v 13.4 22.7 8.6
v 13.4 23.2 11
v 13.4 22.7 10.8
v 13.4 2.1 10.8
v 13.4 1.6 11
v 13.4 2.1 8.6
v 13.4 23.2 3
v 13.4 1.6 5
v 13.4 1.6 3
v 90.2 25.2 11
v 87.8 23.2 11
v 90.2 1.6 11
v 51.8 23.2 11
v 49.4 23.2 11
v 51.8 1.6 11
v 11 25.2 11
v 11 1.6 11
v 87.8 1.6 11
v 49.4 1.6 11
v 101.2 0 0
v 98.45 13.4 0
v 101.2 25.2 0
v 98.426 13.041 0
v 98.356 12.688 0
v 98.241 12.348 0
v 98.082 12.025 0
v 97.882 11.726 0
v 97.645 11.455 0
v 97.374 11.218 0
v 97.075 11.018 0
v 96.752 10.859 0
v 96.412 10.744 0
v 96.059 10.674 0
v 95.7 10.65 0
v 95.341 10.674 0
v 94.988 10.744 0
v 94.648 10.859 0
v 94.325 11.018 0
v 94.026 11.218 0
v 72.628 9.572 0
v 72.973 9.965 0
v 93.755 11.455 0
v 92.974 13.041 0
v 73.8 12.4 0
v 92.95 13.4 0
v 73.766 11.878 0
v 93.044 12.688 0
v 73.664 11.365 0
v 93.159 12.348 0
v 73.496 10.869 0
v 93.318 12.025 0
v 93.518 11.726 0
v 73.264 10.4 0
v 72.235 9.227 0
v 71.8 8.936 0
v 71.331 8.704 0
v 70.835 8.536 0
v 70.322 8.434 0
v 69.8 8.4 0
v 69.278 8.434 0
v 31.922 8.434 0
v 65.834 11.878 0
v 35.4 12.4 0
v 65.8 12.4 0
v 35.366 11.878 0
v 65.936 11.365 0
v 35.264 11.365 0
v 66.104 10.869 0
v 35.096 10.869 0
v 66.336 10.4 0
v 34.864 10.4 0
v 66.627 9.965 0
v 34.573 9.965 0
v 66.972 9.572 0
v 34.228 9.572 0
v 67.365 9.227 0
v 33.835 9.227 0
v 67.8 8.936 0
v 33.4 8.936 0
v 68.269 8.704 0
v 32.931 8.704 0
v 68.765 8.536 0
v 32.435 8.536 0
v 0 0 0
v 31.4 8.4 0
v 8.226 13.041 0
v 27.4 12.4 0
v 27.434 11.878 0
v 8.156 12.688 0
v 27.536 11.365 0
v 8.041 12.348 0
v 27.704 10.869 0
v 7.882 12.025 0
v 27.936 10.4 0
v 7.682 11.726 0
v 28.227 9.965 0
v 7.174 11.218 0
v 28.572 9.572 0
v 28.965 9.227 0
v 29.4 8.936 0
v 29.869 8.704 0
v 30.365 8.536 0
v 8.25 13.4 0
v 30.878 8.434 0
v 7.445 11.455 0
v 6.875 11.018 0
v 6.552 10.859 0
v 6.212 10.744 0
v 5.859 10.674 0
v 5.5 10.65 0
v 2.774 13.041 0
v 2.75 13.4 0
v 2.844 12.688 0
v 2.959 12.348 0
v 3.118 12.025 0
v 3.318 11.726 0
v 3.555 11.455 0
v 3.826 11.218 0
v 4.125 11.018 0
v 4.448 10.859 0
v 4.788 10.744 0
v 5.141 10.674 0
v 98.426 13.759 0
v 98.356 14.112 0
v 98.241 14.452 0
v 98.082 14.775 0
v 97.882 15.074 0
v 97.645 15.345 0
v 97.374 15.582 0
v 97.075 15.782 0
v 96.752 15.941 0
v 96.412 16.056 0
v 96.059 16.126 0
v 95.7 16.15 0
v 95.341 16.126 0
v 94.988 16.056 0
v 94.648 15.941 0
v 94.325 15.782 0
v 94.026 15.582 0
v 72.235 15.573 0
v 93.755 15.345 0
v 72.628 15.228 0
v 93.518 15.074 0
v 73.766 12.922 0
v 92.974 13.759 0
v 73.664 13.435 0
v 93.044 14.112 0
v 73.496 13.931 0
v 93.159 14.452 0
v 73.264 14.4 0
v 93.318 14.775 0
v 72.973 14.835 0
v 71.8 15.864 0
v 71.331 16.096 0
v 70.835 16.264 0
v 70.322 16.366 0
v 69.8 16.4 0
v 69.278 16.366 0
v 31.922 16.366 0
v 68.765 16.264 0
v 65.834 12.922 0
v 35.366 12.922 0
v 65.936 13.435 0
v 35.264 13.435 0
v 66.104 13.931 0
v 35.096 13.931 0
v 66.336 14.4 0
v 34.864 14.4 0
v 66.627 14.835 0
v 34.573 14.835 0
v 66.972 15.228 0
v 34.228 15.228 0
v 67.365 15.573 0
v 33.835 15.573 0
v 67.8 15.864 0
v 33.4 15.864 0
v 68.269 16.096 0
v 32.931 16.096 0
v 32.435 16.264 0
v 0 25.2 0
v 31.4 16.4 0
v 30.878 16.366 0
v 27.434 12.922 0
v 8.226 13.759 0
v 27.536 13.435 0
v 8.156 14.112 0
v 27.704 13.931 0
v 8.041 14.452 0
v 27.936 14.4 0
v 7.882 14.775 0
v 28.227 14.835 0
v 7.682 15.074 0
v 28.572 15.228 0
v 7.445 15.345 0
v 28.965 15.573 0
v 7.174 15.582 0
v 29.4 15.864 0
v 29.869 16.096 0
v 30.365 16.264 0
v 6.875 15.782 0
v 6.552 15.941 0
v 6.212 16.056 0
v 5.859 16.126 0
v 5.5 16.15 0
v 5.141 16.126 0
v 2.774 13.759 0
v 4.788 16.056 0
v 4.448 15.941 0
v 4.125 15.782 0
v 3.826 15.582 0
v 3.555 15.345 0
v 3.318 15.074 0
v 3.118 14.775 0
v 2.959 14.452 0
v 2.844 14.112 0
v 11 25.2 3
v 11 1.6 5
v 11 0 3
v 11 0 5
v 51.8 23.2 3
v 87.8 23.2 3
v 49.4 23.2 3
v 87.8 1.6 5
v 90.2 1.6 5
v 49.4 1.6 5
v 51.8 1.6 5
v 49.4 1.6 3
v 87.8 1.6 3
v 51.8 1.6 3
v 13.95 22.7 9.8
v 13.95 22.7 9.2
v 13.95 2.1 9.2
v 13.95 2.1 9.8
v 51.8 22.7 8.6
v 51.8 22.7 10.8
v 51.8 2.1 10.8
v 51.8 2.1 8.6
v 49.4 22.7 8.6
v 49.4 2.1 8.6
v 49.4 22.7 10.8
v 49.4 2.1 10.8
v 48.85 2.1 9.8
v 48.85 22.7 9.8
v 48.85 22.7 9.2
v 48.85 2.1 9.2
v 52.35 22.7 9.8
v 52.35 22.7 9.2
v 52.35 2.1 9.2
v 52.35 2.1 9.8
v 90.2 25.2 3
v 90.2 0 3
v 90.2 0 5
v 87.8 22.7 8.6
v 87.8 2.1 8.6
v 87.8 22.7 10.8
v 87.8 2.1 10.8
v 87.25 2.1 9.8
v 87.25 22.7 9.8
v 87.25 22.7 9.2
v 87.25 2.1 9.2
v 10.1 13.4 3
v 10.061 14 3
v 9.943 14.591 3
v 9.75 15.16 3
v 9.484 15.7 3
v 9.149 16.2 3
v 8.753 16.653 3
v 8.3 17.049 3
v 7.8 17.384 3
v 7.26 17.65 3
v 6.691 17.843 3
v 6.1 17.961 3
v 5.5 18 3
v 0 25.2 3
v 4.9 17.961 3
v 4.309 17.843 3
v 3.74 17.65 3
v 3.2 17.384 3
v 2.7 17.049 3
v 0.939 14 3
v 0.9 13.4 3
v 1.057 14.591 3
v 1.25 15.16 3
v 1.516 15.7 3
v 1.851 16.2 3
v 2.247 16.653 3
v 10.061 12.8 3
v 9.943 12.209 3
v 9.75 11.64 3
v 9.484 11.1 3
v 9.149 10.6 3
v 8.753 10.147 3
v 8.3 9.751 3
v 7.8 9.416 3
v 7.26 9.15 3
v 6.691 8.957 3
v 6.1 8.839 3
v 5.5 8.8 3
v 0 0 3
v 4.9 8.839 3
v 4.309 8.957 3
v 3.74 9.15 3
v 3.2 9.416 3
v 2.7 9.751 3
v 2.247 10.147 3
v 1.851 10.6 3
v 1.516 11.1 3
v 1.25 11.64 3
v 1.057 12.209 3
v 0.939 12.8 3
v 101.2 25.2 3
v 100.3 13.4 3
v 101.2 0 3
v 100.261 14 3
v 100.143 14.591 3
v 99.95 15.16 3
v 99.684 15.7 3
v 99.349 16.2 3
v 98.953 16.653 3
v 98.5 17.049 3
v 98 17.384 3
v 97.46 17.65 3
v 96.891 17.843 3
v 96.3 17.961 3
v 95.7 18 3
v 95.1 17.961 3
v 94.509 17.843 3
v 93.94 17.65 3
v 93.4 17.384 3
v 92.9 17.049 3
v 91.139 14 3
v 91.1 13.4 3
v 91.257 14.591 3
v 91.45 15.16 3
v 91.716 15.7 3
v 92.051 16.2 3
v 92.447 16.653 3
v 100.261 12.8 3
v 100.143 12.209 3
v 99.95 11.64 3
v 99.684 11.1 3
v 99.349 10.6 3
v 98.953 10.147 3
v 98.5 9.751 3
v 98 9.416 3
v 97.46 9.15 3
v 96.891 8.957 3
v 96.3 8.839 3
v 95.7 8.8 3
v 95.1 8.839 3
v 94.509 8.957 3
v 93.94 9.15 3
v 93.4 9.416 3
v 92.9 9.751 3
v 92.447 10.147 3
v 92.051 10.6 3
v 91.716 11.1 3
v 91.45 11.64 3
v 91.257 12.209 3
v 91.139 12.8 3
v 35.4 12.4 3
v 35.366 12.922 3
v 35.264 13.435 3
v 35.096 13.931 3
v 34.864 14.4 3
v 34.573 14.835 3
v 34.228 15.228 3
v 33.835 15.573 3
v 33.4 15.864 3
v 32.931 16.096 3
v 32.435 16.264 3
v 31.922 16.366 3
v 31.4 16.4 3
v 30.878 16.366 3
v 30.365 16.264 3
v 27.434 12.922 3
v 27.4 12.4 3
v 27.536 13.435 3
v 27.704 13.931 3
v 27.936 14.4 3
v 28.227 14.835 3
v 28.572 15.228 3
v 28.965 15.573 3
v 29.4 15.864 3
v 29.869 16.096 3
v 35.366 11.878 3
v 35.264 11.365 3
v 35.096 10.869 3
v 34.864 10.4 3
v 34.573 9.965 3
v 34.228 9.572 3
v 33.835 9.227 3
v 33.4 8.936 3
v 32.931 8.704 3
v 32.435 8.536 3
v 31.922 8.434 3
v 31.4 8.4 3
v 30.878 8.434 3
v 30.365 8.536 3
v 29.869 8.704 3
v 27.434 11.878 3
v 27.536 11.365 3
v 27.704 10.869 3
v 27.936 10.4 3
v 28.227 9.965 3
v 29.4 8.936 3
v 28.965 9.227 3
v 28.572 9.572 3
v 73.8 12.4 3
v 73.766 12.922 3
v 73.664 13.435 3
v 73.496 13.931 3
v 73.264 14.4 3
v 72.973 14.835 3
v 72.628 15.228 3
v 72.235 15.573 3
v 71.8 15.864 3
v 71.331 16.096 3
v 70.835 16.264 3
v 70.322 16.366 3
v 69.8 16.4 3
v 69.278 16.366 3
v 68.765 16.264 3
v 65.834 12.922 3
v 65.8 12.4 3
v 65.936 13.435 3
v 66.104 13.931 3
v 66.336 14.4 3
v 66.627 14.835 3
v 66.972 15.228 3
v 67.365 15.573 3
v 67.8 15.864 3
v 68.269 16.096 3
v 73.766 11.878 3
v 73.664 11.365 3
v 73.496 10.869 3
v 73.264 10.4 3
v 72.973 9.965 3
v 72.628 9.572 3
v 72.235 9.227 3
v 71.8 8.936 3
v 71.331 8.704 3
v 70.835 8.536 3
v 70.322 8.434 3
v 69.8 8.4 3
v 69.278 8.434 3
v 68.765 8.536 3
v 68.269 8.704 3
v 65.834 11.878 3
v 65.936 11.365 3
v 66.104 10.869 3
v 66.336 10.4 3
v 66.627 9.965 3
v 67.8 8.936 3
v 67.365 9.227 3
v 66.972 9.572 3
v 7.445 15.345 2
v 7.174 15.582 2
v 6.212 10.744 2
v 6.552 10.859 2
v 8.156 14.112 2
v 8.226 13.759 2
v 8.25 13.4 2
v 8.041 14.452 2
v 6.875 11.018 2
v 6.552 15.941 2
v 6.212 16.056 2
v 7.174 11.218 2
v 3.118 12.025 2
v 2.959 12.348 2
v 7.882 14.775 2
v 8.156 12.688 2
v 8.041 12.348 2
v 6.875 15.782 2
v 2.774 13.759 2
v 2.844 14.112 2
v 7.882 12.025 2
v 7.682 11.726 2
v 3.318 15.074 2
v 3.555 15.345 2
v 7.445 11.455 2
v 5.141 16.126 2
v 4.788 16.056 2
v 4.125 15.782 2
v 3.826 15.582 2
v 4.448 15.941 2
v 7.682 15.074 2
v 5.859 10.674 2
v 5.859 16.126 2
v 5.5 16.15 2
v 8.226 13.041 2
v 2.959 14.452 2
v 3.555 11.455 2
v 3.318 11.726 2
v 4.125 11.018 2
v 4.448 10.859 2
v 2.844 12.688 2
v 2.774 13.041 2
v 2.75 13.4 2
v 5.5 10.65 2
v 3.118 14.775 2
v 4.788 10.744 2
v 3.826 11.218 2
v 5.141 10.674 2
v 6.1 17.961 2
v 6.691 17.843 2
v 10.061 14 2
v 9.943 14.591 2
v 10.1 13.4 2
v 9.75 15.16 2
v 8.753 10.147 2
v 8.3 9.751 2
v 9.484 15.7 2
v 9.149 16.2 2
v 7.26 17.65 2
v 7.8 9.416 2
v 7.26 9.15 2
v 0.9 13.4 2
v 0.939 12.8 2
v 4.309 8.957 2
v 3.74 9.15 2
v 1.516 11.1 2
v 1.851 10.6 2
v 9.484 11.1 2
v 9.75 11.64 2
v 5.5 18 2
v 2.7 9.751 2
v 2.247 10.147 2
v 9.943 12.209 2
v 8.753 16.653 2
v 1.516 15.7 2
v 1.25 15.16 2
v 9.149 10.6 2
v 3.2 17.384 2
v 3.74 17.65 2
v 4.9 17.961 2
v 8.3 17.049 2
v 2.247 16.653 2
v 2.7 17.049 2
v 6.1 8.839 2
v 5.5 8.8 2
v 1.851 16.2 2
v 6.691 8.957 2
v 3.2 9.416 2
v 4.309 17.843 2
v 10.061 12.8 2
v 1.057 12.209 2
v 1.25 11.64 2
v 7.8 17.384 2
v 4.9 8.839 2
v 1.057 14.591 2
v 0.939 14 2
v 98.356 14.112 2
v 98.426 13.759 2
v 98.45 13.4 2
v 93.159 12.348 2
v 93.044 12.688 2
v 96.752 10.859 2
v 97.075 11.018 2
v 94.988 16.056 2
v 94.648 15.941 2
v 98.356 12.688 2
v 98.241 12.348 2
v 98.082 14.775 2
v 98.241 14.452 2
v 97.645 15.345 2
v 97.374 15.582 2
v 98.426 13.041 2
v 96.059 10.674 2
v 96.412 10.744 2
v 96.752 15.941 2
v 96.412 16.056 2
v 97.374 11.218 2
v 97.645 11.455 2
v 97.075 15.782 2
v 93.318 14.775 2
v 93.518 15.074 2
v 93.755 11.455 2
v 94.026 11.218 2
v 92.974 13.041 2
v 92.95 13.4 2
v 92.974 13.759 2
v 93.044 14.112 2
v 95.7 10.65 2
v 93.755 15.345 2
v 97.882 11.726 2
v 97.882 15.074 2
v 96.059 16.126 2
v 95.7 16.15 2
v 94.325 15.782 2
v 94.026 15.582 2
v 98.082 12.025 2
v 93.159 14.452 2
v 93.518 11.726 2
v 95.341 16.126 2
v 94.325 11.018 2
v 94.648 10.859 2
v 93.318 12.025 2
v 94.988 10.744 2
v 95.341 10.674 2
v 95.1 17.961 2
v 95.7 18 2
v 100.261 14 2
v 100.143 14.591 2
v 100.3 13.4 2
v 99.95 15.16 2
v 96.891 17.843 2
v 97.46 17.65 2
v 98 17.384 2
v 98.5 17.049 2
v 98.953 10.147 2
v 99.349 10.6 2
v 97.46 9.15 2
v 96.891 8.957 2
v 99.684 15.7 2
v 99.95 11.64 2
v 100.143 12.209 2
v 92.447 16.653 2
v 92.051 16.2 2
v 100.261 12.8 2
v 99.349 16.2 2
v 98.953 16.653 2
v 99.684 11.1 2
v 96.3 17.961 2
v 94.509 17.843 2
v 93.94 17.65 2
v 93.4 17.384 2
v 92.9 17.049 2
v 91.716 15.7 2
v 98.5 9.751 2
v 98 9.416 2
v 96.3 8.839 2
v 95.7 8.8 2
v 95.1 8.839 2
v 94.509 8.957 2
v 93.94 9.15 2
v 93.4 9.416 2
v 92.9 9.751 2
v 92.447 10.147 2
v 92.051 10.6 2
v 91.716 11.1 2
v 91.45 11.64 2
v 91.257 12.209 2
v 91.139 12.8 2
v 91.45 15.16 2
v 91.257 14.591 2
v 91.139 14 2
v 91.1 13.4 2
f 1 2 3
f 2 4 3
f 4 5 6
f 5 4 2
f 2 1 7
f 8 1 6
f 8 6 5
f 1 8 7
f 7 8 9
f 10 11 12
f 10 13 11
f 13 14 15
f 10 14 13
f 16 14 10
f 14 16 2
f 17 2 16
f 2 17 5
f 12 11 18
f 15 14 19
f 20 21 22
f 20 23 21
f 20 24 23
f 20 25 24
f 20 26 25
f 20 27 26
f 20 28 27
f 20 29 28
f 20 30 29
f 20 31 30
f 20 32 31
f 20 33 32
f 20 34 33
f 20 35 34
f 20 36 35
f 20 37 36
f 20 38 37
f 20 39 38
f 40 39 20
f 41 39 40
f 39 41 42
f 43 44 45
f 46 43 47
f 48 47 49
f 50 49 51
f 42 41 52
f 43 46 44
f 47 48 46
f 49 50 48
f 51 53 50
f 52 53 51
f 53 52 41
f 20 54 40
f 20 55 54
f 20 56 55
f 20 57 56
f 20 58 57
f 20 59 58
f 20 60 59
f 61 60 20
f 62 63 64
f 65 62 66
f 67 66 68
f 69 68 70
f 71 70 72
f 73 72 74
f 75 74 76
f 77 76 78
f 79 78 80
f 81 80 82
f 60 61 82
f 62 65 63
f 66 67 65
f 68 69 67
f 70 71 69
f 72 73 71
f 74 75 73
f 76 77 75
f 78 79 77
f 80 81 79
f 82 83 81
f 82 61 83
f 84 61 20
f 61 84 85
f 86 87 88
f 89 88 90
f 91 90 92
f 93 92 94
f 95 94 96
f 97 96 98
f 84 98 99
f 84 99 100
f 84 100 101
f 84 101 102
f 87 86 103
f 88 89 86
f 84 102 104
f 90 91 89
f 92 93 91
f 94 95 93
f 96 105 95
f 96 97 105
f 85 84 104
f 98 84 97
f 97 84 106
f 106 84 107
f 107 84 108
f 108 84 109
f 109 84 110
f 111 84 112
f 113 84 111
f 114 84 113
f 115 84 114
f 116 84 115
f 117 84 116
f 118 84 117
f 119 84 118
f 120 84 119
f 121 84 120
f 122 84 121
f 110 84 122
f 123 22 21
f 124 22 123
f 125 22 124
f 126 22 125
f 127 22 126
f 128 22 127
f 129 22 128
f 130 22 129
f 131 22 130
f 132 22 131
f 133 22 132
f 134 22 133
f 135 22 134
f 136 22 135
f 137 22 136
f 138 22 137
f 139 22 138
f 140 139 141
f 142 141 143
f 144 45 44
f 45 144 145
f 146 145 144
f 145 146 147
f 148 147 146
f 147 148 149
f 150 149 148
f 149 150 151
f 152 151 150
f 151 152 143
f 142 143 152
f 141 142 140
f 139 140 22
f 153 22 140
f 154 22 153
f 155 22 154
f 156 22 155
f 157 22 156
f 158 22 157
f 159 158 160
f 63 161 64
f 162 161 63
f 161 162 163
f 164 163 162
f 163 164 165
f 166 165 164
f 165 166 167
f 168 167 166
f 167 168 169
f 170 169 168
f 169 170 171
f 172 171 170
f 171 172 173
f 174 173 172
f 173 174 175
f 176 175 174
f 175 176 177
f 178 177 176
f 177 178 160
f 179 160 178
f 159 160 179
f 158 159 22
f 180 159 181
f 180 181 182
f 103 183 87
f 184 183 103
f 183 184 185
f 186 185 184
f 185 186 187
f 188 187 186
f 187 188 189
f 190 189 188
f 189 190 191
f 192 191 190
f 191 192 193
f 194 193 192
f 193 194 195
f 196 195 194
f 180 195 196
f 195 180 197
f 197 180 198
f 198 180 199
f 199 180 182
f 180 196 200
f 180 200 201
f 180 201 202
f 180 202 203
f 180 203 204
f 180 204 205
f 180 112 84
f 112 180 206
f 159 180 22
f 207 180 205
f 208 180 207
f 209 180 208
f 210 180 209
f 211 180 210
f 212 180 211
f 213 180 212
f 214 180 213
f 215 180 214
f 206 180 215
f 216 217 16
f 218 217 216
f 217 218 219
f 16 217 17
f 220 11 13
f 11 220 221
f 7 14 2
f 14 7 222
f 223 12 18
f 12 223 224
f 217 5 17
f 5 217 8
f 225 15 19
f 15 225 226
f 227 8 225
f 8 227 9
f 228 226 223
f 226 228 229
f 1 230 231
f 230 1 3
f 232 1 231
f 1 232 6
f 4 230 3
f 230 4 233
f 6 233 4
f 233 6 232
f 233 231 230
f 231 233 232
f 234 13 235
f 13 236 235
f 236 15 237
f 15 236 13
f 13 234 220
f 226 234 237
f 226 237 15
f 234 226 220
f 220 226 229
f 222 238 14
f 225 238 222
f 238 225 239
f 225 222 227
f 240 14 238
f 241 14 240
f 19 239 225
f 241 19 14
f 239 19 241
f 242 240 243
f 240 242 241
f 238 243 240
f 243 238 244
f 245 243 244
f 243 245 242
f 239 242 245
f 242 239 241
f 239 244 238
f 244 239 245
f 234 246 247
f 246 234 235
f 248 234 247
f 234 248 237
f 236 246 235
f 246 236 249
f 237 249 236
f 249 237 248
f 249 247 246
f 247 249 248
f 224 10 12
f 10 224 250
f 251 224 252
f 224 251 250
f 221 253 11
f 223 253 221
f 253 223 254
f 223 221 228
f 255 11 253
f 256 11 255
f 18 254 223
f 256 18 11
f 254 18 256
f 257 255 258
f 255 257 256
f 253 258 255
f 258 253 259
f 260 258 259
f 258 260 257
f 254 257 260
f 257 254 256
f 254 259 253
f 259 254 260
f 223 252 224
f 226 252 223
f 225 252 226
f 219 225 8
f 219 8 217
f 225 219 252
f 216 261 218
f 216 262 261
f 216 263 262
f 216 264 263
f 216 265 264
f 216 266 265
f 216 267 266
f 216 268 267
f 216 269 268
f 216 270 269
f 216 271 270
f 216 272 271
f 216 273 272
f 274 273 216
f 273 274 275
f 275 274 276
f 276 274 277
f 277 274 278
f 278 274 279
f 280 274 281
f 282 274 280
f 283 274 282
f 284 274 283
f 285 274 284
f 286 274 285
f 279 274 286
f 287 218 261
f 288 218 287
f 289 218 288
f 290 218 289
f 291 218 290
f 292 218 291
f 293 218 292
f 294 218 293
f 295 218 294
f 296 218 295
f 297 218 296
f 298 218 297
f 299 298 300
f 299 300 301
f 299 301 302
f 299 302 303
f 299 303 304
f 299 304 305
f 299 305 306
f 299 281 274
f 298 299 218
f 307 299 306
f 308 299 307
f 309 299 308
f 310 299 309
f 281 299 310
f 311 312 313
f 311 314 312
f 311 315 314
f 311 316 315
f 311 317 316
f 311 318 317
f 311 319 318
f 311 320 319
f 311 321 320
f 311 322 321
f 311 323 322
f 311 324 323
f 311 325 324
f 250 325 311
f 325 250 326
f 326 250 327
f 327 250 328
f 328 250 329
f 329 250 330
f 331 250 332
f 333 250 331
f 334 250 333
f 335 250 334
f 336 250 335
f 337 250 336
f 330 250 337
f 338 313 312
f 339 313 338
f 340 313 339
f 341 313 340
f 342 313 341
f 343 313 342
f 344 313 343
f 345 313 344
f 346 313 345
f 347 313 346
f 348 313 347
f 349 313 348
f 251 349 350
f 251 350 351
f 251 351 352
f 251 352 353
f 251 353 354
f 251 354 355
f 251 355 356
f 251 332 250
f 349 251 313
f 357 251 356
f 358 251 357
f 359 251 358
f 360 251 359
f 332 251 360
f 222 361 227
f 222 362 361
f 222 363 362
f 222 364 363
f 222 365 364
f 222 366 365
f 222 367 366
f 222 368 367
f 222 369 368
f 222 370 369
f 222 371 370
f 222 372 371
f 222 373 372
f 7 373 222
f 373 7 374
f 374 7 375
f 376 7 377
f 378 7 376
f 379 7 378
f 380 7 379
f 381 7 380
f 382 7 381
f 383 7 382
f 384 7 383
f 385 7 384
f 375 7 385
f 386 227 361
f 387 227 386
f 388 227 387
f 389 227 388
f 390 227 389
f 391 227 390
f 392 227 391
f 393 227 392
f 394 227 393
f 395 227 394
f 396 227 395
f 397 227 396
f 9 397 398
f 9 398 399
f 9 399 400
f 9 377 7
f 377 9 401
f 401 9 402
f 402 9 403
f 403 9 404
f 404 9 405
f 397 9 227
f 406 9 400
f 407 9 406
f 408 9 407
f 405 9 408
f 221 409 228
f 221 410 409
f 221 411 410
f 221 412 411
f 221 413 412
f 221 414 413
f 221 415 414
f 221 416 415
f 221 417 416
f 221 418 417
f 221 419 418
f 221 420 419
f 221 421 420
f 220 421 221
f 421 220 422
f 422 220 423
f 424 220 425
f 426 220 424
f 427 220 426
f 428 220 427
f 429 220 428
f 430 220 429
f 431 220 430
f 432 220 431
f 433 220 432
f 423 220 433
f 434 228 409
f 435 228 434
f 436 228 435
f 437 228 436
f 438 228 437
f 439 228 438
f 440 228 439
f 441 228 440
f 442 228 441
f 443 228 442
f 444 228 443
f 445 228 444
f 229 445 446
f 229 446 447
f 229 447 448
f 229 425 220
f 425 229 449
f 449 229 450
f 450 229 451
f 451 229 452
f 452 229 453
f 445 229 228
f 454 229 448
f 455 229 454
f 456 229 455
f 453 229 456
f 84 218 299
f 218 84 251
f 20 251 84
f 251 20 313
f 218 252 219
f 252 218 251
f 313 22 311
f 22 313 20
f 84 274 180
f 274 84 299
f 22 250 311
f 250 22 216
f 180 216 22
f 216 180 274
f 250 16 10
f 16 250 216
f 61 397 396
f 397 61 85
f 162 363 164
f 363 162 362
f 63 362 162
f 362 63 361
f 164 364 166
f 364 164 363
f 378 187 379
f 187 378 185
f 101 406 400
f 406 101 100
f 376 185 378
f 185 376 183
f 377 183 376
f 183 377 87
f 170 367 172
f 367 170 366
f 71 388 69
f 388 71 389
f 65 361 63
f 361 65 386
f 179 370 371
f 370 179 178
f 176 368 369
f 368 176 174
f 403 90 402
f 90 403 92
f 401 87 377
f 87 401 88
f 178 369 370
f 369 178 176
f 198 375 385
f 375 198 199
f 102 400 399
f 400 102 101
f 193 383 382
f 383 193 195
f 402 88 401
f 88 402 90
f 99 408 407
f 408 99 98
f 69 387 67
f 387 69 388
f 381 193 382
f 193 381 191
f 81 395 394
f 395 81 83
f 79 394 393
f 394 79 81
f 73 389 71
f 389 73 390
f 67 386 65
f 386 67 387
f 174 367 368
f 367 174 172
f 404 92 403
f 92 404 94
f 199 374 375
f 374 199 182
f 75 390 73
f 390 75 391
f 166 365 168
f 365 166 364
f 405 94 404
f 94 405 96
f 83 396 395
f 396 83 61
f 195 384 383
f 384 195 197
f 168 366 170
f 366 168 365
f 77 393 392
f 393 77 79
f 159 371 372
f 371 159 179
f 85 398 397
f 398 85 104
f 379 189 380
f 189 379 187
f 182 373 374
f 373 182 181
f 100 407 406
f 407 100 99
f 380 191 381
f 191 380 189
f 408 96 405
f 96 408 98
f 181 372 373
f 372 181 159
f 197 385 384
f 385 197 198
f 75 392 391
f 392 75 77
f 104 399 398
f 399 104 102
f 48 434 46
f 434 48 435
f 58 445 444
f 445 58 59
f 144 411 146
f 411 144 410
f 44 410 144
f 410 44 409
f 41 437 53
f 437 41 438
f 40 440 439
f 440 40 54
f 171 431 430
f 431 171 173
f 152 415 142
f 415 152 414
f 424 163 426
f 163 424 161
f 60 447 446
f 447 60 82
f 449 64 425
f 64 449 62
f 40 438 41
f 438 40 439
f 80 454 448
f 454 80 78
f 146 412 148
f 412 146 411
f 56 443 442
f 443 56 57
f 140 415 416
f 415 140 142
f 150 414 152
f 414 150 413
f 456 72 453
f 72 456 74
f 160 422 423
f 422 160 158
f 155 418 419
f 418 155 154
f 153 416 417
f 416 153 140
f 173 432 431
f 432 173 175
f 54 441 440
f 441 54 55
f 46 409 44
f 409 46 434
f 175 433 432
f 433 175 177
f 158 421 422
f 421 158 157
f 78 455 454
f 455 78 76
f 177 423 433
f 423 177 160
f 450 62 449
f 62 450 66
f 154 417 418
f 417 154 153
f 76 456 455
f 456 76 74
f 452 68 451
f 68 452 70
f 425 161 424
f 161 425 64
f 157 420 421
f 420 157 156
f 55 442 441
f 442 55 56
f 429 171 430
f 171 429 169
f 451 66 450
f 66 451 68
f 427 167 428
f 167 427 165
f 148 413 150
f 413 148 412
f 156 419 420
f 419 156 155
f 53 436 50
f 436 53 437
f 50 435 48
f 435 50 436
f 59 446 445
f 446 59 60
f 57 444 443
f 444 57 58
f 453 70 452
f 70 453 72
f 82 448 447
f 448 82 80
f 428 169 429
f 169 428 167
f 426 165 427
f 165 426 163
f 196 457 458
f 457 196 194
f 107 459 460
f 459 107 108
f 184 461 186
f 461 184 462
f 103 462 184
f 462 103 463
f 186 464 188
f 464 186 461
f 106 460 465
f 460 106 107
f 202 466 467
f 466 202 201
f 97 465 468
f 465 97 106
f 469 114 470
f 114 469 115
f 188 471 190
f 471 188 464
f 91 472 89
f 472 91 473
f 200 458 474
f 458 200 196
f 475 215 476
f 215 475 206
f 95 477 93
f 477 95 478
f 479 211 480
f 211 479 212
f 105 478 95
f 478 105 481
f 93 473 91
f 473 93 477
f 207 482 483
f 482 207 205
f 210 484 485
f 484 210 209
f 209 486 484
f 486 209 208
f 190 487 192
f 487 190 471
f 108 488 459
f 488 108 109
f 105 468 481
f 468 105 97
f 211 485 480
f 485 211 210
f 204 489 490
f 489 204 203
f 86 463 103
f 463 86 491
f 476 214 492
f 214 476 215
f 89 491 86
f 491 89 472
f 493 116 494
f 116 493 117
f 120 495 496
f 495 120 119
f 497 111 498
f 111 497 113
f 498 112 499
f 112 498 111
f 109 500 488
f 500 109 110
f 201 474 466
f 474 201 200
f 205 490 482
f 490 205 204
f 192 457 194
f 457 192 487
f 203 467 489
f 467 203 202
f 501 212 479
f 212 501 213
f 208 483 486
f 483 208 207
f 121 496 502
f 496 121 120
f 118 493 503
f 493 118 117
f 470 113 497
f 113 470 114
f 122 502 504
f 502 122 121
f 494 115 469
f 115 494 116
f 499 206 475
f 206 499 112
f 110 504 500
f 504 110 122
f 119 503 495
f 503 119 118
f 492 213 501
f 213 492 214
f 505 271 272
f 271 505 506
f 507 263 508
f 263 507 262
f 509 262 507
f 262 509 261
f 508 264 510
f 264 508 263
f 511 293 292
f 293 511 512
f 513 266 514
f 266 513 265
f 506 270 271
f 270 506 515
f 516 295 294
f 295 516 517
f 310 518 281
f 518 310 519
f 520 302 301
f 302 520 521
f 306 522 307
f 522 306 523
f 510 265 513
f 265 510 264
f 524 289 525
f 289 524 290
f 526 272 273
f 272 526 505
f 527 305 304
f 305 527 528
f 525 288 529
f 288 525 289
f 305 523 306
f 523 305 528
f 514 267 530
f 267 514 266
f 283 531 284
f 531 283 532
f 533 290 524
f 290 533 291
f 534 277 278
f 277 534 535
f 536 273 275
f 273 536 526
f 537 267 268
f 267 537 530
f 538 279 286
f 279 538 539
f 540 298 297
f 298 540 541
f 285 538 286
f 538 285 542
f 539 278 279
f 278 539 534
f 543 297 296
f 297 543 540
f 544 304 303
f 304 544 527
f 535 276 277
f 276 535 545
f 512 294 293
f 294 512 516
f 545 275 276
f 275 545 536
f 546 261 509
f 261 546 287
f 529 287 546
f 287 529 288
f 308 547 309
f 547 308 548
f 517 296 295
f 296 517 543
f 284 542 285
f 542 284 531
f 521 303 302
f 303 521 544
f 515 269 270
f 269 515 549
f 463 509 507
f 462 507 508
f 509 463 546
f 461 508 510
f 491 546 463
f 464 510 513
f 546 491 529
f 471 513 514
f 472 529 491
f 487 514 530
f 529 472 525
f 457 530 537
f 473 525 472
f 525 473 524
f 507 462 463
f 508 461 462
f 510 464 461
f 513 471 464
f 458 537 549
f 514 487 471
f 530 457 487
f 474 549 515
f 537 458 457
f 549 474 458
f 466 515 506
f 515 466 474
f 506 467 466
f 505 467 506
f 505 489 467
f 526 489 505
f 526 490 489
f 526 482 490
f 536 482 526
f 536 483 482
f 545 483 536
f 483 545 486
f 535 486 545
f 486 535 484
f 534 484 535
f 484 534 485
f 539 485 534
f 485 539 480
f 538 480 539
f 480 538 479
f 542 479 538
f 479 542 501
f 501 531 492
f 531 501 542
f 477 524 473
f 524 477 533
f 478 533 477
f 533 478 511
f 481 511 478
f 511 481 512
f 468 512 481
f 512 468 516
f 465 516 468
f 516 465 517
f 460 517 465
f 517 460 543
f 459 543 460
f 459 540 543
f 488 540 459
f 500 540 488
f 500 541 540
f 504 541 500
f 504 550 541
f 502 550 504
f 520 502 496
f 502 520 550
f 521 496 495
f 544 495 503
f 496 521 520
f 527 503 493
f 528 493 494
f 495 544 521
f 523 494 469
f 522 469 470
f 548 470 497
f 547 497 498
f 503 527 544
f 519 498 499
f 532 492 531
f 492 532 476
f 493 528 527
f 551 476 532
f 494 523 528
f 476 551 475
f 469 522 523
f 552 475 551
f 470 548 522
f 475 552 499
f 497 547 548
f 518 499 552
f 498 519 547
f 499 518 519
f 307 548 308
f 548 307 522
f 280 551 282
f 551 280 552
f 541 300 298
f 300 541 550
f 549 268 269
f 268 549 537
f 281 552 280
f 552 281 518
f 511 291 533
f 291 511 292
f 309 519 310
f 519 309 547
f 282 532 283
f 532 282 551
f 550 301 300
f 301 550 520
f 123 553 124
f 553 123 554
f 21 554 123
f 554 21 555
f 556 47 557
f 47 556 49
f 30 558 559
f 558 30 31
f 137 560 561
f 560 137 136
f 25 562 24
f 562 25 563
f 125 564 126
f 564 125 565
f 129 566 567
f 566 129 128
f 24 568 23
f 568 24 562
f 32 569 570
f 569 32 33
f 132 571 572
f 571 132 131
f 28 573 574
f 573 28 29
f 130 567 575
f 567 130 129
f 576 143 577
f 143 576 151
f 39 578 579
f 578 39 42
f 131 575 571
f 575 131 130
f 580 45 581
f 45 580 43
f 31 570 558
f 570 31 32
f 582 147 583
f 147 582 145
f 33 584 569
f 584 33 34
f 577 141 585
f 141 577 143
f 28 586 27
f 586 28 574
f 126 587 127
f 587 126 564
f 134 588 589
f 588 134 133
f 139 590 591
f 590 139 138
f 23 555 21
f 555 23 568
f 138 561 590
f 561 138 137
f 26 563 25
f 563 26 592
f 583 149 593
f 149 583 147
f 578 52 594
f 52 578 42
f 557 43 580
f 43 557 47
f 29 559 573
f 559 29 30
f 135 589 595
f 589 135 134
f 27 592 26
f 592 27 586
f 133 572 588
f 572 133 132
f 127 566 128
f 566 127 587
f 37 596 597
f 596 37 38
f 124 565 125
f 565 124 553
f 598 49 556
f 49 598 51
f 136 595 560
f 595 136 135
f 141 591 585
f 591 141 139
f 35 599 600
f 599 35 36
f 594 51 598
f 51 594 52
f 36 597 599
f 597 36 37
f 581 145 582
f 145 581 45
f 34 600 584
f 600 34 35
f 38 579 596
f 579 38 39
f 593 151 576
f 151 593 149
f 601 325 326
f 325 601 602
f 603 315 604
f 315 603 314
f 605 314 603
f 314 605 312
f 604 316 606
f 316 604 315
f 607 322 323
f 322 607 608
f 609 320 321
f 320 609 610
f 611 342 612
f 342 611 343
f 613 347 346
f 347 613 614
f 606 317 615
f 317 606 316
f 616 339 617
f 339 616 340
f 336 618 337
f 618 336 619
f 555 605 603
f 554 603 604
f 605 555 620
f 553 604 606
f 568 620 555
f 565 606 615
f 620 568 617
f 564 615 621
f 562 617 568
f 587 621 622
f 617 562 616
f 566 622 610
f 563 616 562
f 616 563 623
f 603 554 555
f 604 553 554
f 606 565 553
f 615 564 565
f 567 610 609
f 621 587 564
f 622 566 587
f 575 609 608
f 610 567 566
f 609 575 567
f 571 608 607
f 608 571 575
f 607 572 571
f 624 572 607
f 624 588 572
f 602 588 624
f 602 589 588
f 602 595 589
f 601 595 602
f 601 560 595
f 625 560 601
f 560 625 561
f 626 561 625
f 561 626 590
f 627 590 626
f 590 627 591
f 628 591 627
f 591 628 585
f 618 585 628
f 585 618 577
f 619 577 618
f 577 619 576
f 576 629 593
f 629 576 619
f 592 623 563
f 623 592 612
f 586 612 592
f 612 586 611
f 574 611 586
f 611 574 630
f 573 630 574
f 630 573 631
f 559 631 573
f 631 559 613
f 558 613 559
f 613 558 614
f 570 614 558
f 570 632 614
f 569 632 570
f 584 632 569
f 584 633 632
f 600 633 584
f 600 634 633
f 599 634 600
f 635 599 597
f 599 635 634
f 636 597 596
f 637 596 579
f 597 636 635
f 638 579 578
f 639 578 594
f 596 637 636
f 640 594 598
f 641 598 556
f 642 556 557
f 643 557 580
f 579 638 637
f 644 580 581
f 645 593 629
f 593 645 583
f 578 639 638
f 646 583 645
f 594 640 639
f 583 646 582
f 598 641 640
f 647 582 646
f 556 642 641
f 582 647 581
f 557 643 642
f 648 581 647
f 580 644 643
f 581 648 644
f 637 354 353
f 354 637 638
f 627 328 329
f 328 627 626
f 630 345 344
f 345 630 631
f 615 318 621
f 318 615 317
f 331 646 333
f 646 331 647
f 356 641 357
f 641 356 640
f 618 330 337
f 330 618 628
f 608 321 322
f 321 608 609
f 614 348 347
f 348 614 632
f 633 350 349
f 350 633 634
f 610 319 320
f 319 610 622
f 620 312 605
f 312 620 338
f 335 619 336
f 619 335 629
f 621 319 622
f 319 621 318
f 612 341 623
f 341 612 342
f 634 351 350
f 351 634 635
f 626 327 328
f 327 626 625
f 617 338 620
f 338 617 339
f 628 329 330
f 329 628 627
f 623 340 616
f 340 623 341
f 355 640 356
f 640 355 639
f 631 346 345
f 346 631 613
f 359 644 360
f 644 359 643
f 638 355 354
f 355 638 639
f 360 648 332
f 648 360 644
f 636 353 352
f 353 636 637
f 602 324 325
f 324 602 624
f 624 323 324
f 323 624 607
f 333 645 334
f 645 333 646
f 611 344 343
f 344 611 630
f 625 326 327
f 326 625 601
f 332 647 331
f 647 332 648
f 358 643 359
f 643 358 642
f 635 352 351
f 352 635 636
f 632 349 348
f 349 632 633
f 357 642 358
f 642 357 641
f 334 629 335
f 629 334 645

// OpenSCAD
// Double mount for 5-position Wago-style lever connectors (clones)
// Flat back for mounting on aluminium extrusion (e.g. 2020) with M5 T-nuts.
// All dimensions in mm.

/* [Connector] */
CL = 35.0;      // connector length (along the levers)
CD = 21.0;      // connector depth (wire-entry direction)
CH = 11.0;      // connector height (reference only)

/* [Fit] */
TOL   = 0.3;    // clearance per side, depth
TOLX  = 0.5;    // clearance per side, length
// side snap-lip overhang into each pocket, listed left to right
// as seen looking at the open wire side, levers up
LIPS  = [0.55, 0.55];

/* [Body] */
N     = 2;      // number of connectors
BASE  = 3.0;    // base plate thickness
WALL  = 2.4;    // end / divider wall thickness
BACK  = 2.0;    // back wall thickness
WALLH = 8.0;    // wall height above base
FLIPH = 2.0;    // front lip height above base
FLIPT = 1.6;    // front lip thickness

/* [Mounting] */
TAB   = 11.0;   // screw tab length at each end
HOLE  = 5.5;    // screw clearance hole (M5)
HEAD  = 9.2;    // screw head seat diameter
PUSH  = 8.0;    // push-out hole under each pocket

$fn = 48;

PL = CL + 2*TOLX;   // pocket length
PD = CD + 2*TOL;    // pocket depth
L  = 2*TAB + N*PL + (N+1)*WALL;
D  = PD + BACK;
x0 = TAB;

// sloped snap lip on a wall face; dir = +1 points +X, -1 points -X
module side_lip(xpos, dir, lip) {
    translate([xpos, PD - 0.5, BASE + WALLH - 2.4])
        mirror([dir < 0 ? 1 : 0, 0, 0])
            rotate([90, 0, 0])
                linear_extrude(PD - 1.0)
                    polygon([[0, 0], [lip, 0.6], [lip, 1.2], [0, 2.2]]);
}

module mount() {
    difference() {
        union() {
            // base plate
            cube([L, D, BASE]);
            // back wall
            translate([x0, PD, 0]) cube([N*PL + (N+1)*WALL, BACK, BASE + WALLH]);
            // end + divider walls with side lips
            for (i = [0 : N]) {
                wx = x0 + i*(PL + WALL);
                translate([wx, 0, 0]) cube([WALL, PD, BASE + WALLH]);
                if (i > 0) side_lip(wx, -1, LIPS[i-1]);
                if (i < N) side_lip(wx + WALL, +1, LIPS[i]);
            }
            // front: base extension, lips, wall stubs
            translate([0, -FLIPT, 0]) cube([L, FLIPT, BASE]);
            for (i = [0 : N-1])
                translate([x0 + WALL + i*(PL + WALL), -FLIPT, BASE]) cube([PL, FLIPT, FLIPH]);
            for (i = [0 : N])
                translate([x0 + i*(PL + WALL), -FLIPT, 0]) cube([WALL, FLIPT, BASE + FLIPH]);
        }
        // push-out holes
        for (i = [0 : N-1])
            translate([x0 + WALL + i*(PL + WALL) + PL/2, PD/2, -1])
                cylinder(h = BASE + 2, d = PUSH);
        // screw holes + head seats
        for (sx = [TAB/2, L - TAB/2]) {
            translate([sx, D/2, -1]) cylinder(h = BASE + 2, d = HOLE);
            translate([sx, D/2, BASE - 1]) cylinder(h = 2, d = HEAD);
        }
    }
}

translate([0, FLIPT, 0]) mount();
